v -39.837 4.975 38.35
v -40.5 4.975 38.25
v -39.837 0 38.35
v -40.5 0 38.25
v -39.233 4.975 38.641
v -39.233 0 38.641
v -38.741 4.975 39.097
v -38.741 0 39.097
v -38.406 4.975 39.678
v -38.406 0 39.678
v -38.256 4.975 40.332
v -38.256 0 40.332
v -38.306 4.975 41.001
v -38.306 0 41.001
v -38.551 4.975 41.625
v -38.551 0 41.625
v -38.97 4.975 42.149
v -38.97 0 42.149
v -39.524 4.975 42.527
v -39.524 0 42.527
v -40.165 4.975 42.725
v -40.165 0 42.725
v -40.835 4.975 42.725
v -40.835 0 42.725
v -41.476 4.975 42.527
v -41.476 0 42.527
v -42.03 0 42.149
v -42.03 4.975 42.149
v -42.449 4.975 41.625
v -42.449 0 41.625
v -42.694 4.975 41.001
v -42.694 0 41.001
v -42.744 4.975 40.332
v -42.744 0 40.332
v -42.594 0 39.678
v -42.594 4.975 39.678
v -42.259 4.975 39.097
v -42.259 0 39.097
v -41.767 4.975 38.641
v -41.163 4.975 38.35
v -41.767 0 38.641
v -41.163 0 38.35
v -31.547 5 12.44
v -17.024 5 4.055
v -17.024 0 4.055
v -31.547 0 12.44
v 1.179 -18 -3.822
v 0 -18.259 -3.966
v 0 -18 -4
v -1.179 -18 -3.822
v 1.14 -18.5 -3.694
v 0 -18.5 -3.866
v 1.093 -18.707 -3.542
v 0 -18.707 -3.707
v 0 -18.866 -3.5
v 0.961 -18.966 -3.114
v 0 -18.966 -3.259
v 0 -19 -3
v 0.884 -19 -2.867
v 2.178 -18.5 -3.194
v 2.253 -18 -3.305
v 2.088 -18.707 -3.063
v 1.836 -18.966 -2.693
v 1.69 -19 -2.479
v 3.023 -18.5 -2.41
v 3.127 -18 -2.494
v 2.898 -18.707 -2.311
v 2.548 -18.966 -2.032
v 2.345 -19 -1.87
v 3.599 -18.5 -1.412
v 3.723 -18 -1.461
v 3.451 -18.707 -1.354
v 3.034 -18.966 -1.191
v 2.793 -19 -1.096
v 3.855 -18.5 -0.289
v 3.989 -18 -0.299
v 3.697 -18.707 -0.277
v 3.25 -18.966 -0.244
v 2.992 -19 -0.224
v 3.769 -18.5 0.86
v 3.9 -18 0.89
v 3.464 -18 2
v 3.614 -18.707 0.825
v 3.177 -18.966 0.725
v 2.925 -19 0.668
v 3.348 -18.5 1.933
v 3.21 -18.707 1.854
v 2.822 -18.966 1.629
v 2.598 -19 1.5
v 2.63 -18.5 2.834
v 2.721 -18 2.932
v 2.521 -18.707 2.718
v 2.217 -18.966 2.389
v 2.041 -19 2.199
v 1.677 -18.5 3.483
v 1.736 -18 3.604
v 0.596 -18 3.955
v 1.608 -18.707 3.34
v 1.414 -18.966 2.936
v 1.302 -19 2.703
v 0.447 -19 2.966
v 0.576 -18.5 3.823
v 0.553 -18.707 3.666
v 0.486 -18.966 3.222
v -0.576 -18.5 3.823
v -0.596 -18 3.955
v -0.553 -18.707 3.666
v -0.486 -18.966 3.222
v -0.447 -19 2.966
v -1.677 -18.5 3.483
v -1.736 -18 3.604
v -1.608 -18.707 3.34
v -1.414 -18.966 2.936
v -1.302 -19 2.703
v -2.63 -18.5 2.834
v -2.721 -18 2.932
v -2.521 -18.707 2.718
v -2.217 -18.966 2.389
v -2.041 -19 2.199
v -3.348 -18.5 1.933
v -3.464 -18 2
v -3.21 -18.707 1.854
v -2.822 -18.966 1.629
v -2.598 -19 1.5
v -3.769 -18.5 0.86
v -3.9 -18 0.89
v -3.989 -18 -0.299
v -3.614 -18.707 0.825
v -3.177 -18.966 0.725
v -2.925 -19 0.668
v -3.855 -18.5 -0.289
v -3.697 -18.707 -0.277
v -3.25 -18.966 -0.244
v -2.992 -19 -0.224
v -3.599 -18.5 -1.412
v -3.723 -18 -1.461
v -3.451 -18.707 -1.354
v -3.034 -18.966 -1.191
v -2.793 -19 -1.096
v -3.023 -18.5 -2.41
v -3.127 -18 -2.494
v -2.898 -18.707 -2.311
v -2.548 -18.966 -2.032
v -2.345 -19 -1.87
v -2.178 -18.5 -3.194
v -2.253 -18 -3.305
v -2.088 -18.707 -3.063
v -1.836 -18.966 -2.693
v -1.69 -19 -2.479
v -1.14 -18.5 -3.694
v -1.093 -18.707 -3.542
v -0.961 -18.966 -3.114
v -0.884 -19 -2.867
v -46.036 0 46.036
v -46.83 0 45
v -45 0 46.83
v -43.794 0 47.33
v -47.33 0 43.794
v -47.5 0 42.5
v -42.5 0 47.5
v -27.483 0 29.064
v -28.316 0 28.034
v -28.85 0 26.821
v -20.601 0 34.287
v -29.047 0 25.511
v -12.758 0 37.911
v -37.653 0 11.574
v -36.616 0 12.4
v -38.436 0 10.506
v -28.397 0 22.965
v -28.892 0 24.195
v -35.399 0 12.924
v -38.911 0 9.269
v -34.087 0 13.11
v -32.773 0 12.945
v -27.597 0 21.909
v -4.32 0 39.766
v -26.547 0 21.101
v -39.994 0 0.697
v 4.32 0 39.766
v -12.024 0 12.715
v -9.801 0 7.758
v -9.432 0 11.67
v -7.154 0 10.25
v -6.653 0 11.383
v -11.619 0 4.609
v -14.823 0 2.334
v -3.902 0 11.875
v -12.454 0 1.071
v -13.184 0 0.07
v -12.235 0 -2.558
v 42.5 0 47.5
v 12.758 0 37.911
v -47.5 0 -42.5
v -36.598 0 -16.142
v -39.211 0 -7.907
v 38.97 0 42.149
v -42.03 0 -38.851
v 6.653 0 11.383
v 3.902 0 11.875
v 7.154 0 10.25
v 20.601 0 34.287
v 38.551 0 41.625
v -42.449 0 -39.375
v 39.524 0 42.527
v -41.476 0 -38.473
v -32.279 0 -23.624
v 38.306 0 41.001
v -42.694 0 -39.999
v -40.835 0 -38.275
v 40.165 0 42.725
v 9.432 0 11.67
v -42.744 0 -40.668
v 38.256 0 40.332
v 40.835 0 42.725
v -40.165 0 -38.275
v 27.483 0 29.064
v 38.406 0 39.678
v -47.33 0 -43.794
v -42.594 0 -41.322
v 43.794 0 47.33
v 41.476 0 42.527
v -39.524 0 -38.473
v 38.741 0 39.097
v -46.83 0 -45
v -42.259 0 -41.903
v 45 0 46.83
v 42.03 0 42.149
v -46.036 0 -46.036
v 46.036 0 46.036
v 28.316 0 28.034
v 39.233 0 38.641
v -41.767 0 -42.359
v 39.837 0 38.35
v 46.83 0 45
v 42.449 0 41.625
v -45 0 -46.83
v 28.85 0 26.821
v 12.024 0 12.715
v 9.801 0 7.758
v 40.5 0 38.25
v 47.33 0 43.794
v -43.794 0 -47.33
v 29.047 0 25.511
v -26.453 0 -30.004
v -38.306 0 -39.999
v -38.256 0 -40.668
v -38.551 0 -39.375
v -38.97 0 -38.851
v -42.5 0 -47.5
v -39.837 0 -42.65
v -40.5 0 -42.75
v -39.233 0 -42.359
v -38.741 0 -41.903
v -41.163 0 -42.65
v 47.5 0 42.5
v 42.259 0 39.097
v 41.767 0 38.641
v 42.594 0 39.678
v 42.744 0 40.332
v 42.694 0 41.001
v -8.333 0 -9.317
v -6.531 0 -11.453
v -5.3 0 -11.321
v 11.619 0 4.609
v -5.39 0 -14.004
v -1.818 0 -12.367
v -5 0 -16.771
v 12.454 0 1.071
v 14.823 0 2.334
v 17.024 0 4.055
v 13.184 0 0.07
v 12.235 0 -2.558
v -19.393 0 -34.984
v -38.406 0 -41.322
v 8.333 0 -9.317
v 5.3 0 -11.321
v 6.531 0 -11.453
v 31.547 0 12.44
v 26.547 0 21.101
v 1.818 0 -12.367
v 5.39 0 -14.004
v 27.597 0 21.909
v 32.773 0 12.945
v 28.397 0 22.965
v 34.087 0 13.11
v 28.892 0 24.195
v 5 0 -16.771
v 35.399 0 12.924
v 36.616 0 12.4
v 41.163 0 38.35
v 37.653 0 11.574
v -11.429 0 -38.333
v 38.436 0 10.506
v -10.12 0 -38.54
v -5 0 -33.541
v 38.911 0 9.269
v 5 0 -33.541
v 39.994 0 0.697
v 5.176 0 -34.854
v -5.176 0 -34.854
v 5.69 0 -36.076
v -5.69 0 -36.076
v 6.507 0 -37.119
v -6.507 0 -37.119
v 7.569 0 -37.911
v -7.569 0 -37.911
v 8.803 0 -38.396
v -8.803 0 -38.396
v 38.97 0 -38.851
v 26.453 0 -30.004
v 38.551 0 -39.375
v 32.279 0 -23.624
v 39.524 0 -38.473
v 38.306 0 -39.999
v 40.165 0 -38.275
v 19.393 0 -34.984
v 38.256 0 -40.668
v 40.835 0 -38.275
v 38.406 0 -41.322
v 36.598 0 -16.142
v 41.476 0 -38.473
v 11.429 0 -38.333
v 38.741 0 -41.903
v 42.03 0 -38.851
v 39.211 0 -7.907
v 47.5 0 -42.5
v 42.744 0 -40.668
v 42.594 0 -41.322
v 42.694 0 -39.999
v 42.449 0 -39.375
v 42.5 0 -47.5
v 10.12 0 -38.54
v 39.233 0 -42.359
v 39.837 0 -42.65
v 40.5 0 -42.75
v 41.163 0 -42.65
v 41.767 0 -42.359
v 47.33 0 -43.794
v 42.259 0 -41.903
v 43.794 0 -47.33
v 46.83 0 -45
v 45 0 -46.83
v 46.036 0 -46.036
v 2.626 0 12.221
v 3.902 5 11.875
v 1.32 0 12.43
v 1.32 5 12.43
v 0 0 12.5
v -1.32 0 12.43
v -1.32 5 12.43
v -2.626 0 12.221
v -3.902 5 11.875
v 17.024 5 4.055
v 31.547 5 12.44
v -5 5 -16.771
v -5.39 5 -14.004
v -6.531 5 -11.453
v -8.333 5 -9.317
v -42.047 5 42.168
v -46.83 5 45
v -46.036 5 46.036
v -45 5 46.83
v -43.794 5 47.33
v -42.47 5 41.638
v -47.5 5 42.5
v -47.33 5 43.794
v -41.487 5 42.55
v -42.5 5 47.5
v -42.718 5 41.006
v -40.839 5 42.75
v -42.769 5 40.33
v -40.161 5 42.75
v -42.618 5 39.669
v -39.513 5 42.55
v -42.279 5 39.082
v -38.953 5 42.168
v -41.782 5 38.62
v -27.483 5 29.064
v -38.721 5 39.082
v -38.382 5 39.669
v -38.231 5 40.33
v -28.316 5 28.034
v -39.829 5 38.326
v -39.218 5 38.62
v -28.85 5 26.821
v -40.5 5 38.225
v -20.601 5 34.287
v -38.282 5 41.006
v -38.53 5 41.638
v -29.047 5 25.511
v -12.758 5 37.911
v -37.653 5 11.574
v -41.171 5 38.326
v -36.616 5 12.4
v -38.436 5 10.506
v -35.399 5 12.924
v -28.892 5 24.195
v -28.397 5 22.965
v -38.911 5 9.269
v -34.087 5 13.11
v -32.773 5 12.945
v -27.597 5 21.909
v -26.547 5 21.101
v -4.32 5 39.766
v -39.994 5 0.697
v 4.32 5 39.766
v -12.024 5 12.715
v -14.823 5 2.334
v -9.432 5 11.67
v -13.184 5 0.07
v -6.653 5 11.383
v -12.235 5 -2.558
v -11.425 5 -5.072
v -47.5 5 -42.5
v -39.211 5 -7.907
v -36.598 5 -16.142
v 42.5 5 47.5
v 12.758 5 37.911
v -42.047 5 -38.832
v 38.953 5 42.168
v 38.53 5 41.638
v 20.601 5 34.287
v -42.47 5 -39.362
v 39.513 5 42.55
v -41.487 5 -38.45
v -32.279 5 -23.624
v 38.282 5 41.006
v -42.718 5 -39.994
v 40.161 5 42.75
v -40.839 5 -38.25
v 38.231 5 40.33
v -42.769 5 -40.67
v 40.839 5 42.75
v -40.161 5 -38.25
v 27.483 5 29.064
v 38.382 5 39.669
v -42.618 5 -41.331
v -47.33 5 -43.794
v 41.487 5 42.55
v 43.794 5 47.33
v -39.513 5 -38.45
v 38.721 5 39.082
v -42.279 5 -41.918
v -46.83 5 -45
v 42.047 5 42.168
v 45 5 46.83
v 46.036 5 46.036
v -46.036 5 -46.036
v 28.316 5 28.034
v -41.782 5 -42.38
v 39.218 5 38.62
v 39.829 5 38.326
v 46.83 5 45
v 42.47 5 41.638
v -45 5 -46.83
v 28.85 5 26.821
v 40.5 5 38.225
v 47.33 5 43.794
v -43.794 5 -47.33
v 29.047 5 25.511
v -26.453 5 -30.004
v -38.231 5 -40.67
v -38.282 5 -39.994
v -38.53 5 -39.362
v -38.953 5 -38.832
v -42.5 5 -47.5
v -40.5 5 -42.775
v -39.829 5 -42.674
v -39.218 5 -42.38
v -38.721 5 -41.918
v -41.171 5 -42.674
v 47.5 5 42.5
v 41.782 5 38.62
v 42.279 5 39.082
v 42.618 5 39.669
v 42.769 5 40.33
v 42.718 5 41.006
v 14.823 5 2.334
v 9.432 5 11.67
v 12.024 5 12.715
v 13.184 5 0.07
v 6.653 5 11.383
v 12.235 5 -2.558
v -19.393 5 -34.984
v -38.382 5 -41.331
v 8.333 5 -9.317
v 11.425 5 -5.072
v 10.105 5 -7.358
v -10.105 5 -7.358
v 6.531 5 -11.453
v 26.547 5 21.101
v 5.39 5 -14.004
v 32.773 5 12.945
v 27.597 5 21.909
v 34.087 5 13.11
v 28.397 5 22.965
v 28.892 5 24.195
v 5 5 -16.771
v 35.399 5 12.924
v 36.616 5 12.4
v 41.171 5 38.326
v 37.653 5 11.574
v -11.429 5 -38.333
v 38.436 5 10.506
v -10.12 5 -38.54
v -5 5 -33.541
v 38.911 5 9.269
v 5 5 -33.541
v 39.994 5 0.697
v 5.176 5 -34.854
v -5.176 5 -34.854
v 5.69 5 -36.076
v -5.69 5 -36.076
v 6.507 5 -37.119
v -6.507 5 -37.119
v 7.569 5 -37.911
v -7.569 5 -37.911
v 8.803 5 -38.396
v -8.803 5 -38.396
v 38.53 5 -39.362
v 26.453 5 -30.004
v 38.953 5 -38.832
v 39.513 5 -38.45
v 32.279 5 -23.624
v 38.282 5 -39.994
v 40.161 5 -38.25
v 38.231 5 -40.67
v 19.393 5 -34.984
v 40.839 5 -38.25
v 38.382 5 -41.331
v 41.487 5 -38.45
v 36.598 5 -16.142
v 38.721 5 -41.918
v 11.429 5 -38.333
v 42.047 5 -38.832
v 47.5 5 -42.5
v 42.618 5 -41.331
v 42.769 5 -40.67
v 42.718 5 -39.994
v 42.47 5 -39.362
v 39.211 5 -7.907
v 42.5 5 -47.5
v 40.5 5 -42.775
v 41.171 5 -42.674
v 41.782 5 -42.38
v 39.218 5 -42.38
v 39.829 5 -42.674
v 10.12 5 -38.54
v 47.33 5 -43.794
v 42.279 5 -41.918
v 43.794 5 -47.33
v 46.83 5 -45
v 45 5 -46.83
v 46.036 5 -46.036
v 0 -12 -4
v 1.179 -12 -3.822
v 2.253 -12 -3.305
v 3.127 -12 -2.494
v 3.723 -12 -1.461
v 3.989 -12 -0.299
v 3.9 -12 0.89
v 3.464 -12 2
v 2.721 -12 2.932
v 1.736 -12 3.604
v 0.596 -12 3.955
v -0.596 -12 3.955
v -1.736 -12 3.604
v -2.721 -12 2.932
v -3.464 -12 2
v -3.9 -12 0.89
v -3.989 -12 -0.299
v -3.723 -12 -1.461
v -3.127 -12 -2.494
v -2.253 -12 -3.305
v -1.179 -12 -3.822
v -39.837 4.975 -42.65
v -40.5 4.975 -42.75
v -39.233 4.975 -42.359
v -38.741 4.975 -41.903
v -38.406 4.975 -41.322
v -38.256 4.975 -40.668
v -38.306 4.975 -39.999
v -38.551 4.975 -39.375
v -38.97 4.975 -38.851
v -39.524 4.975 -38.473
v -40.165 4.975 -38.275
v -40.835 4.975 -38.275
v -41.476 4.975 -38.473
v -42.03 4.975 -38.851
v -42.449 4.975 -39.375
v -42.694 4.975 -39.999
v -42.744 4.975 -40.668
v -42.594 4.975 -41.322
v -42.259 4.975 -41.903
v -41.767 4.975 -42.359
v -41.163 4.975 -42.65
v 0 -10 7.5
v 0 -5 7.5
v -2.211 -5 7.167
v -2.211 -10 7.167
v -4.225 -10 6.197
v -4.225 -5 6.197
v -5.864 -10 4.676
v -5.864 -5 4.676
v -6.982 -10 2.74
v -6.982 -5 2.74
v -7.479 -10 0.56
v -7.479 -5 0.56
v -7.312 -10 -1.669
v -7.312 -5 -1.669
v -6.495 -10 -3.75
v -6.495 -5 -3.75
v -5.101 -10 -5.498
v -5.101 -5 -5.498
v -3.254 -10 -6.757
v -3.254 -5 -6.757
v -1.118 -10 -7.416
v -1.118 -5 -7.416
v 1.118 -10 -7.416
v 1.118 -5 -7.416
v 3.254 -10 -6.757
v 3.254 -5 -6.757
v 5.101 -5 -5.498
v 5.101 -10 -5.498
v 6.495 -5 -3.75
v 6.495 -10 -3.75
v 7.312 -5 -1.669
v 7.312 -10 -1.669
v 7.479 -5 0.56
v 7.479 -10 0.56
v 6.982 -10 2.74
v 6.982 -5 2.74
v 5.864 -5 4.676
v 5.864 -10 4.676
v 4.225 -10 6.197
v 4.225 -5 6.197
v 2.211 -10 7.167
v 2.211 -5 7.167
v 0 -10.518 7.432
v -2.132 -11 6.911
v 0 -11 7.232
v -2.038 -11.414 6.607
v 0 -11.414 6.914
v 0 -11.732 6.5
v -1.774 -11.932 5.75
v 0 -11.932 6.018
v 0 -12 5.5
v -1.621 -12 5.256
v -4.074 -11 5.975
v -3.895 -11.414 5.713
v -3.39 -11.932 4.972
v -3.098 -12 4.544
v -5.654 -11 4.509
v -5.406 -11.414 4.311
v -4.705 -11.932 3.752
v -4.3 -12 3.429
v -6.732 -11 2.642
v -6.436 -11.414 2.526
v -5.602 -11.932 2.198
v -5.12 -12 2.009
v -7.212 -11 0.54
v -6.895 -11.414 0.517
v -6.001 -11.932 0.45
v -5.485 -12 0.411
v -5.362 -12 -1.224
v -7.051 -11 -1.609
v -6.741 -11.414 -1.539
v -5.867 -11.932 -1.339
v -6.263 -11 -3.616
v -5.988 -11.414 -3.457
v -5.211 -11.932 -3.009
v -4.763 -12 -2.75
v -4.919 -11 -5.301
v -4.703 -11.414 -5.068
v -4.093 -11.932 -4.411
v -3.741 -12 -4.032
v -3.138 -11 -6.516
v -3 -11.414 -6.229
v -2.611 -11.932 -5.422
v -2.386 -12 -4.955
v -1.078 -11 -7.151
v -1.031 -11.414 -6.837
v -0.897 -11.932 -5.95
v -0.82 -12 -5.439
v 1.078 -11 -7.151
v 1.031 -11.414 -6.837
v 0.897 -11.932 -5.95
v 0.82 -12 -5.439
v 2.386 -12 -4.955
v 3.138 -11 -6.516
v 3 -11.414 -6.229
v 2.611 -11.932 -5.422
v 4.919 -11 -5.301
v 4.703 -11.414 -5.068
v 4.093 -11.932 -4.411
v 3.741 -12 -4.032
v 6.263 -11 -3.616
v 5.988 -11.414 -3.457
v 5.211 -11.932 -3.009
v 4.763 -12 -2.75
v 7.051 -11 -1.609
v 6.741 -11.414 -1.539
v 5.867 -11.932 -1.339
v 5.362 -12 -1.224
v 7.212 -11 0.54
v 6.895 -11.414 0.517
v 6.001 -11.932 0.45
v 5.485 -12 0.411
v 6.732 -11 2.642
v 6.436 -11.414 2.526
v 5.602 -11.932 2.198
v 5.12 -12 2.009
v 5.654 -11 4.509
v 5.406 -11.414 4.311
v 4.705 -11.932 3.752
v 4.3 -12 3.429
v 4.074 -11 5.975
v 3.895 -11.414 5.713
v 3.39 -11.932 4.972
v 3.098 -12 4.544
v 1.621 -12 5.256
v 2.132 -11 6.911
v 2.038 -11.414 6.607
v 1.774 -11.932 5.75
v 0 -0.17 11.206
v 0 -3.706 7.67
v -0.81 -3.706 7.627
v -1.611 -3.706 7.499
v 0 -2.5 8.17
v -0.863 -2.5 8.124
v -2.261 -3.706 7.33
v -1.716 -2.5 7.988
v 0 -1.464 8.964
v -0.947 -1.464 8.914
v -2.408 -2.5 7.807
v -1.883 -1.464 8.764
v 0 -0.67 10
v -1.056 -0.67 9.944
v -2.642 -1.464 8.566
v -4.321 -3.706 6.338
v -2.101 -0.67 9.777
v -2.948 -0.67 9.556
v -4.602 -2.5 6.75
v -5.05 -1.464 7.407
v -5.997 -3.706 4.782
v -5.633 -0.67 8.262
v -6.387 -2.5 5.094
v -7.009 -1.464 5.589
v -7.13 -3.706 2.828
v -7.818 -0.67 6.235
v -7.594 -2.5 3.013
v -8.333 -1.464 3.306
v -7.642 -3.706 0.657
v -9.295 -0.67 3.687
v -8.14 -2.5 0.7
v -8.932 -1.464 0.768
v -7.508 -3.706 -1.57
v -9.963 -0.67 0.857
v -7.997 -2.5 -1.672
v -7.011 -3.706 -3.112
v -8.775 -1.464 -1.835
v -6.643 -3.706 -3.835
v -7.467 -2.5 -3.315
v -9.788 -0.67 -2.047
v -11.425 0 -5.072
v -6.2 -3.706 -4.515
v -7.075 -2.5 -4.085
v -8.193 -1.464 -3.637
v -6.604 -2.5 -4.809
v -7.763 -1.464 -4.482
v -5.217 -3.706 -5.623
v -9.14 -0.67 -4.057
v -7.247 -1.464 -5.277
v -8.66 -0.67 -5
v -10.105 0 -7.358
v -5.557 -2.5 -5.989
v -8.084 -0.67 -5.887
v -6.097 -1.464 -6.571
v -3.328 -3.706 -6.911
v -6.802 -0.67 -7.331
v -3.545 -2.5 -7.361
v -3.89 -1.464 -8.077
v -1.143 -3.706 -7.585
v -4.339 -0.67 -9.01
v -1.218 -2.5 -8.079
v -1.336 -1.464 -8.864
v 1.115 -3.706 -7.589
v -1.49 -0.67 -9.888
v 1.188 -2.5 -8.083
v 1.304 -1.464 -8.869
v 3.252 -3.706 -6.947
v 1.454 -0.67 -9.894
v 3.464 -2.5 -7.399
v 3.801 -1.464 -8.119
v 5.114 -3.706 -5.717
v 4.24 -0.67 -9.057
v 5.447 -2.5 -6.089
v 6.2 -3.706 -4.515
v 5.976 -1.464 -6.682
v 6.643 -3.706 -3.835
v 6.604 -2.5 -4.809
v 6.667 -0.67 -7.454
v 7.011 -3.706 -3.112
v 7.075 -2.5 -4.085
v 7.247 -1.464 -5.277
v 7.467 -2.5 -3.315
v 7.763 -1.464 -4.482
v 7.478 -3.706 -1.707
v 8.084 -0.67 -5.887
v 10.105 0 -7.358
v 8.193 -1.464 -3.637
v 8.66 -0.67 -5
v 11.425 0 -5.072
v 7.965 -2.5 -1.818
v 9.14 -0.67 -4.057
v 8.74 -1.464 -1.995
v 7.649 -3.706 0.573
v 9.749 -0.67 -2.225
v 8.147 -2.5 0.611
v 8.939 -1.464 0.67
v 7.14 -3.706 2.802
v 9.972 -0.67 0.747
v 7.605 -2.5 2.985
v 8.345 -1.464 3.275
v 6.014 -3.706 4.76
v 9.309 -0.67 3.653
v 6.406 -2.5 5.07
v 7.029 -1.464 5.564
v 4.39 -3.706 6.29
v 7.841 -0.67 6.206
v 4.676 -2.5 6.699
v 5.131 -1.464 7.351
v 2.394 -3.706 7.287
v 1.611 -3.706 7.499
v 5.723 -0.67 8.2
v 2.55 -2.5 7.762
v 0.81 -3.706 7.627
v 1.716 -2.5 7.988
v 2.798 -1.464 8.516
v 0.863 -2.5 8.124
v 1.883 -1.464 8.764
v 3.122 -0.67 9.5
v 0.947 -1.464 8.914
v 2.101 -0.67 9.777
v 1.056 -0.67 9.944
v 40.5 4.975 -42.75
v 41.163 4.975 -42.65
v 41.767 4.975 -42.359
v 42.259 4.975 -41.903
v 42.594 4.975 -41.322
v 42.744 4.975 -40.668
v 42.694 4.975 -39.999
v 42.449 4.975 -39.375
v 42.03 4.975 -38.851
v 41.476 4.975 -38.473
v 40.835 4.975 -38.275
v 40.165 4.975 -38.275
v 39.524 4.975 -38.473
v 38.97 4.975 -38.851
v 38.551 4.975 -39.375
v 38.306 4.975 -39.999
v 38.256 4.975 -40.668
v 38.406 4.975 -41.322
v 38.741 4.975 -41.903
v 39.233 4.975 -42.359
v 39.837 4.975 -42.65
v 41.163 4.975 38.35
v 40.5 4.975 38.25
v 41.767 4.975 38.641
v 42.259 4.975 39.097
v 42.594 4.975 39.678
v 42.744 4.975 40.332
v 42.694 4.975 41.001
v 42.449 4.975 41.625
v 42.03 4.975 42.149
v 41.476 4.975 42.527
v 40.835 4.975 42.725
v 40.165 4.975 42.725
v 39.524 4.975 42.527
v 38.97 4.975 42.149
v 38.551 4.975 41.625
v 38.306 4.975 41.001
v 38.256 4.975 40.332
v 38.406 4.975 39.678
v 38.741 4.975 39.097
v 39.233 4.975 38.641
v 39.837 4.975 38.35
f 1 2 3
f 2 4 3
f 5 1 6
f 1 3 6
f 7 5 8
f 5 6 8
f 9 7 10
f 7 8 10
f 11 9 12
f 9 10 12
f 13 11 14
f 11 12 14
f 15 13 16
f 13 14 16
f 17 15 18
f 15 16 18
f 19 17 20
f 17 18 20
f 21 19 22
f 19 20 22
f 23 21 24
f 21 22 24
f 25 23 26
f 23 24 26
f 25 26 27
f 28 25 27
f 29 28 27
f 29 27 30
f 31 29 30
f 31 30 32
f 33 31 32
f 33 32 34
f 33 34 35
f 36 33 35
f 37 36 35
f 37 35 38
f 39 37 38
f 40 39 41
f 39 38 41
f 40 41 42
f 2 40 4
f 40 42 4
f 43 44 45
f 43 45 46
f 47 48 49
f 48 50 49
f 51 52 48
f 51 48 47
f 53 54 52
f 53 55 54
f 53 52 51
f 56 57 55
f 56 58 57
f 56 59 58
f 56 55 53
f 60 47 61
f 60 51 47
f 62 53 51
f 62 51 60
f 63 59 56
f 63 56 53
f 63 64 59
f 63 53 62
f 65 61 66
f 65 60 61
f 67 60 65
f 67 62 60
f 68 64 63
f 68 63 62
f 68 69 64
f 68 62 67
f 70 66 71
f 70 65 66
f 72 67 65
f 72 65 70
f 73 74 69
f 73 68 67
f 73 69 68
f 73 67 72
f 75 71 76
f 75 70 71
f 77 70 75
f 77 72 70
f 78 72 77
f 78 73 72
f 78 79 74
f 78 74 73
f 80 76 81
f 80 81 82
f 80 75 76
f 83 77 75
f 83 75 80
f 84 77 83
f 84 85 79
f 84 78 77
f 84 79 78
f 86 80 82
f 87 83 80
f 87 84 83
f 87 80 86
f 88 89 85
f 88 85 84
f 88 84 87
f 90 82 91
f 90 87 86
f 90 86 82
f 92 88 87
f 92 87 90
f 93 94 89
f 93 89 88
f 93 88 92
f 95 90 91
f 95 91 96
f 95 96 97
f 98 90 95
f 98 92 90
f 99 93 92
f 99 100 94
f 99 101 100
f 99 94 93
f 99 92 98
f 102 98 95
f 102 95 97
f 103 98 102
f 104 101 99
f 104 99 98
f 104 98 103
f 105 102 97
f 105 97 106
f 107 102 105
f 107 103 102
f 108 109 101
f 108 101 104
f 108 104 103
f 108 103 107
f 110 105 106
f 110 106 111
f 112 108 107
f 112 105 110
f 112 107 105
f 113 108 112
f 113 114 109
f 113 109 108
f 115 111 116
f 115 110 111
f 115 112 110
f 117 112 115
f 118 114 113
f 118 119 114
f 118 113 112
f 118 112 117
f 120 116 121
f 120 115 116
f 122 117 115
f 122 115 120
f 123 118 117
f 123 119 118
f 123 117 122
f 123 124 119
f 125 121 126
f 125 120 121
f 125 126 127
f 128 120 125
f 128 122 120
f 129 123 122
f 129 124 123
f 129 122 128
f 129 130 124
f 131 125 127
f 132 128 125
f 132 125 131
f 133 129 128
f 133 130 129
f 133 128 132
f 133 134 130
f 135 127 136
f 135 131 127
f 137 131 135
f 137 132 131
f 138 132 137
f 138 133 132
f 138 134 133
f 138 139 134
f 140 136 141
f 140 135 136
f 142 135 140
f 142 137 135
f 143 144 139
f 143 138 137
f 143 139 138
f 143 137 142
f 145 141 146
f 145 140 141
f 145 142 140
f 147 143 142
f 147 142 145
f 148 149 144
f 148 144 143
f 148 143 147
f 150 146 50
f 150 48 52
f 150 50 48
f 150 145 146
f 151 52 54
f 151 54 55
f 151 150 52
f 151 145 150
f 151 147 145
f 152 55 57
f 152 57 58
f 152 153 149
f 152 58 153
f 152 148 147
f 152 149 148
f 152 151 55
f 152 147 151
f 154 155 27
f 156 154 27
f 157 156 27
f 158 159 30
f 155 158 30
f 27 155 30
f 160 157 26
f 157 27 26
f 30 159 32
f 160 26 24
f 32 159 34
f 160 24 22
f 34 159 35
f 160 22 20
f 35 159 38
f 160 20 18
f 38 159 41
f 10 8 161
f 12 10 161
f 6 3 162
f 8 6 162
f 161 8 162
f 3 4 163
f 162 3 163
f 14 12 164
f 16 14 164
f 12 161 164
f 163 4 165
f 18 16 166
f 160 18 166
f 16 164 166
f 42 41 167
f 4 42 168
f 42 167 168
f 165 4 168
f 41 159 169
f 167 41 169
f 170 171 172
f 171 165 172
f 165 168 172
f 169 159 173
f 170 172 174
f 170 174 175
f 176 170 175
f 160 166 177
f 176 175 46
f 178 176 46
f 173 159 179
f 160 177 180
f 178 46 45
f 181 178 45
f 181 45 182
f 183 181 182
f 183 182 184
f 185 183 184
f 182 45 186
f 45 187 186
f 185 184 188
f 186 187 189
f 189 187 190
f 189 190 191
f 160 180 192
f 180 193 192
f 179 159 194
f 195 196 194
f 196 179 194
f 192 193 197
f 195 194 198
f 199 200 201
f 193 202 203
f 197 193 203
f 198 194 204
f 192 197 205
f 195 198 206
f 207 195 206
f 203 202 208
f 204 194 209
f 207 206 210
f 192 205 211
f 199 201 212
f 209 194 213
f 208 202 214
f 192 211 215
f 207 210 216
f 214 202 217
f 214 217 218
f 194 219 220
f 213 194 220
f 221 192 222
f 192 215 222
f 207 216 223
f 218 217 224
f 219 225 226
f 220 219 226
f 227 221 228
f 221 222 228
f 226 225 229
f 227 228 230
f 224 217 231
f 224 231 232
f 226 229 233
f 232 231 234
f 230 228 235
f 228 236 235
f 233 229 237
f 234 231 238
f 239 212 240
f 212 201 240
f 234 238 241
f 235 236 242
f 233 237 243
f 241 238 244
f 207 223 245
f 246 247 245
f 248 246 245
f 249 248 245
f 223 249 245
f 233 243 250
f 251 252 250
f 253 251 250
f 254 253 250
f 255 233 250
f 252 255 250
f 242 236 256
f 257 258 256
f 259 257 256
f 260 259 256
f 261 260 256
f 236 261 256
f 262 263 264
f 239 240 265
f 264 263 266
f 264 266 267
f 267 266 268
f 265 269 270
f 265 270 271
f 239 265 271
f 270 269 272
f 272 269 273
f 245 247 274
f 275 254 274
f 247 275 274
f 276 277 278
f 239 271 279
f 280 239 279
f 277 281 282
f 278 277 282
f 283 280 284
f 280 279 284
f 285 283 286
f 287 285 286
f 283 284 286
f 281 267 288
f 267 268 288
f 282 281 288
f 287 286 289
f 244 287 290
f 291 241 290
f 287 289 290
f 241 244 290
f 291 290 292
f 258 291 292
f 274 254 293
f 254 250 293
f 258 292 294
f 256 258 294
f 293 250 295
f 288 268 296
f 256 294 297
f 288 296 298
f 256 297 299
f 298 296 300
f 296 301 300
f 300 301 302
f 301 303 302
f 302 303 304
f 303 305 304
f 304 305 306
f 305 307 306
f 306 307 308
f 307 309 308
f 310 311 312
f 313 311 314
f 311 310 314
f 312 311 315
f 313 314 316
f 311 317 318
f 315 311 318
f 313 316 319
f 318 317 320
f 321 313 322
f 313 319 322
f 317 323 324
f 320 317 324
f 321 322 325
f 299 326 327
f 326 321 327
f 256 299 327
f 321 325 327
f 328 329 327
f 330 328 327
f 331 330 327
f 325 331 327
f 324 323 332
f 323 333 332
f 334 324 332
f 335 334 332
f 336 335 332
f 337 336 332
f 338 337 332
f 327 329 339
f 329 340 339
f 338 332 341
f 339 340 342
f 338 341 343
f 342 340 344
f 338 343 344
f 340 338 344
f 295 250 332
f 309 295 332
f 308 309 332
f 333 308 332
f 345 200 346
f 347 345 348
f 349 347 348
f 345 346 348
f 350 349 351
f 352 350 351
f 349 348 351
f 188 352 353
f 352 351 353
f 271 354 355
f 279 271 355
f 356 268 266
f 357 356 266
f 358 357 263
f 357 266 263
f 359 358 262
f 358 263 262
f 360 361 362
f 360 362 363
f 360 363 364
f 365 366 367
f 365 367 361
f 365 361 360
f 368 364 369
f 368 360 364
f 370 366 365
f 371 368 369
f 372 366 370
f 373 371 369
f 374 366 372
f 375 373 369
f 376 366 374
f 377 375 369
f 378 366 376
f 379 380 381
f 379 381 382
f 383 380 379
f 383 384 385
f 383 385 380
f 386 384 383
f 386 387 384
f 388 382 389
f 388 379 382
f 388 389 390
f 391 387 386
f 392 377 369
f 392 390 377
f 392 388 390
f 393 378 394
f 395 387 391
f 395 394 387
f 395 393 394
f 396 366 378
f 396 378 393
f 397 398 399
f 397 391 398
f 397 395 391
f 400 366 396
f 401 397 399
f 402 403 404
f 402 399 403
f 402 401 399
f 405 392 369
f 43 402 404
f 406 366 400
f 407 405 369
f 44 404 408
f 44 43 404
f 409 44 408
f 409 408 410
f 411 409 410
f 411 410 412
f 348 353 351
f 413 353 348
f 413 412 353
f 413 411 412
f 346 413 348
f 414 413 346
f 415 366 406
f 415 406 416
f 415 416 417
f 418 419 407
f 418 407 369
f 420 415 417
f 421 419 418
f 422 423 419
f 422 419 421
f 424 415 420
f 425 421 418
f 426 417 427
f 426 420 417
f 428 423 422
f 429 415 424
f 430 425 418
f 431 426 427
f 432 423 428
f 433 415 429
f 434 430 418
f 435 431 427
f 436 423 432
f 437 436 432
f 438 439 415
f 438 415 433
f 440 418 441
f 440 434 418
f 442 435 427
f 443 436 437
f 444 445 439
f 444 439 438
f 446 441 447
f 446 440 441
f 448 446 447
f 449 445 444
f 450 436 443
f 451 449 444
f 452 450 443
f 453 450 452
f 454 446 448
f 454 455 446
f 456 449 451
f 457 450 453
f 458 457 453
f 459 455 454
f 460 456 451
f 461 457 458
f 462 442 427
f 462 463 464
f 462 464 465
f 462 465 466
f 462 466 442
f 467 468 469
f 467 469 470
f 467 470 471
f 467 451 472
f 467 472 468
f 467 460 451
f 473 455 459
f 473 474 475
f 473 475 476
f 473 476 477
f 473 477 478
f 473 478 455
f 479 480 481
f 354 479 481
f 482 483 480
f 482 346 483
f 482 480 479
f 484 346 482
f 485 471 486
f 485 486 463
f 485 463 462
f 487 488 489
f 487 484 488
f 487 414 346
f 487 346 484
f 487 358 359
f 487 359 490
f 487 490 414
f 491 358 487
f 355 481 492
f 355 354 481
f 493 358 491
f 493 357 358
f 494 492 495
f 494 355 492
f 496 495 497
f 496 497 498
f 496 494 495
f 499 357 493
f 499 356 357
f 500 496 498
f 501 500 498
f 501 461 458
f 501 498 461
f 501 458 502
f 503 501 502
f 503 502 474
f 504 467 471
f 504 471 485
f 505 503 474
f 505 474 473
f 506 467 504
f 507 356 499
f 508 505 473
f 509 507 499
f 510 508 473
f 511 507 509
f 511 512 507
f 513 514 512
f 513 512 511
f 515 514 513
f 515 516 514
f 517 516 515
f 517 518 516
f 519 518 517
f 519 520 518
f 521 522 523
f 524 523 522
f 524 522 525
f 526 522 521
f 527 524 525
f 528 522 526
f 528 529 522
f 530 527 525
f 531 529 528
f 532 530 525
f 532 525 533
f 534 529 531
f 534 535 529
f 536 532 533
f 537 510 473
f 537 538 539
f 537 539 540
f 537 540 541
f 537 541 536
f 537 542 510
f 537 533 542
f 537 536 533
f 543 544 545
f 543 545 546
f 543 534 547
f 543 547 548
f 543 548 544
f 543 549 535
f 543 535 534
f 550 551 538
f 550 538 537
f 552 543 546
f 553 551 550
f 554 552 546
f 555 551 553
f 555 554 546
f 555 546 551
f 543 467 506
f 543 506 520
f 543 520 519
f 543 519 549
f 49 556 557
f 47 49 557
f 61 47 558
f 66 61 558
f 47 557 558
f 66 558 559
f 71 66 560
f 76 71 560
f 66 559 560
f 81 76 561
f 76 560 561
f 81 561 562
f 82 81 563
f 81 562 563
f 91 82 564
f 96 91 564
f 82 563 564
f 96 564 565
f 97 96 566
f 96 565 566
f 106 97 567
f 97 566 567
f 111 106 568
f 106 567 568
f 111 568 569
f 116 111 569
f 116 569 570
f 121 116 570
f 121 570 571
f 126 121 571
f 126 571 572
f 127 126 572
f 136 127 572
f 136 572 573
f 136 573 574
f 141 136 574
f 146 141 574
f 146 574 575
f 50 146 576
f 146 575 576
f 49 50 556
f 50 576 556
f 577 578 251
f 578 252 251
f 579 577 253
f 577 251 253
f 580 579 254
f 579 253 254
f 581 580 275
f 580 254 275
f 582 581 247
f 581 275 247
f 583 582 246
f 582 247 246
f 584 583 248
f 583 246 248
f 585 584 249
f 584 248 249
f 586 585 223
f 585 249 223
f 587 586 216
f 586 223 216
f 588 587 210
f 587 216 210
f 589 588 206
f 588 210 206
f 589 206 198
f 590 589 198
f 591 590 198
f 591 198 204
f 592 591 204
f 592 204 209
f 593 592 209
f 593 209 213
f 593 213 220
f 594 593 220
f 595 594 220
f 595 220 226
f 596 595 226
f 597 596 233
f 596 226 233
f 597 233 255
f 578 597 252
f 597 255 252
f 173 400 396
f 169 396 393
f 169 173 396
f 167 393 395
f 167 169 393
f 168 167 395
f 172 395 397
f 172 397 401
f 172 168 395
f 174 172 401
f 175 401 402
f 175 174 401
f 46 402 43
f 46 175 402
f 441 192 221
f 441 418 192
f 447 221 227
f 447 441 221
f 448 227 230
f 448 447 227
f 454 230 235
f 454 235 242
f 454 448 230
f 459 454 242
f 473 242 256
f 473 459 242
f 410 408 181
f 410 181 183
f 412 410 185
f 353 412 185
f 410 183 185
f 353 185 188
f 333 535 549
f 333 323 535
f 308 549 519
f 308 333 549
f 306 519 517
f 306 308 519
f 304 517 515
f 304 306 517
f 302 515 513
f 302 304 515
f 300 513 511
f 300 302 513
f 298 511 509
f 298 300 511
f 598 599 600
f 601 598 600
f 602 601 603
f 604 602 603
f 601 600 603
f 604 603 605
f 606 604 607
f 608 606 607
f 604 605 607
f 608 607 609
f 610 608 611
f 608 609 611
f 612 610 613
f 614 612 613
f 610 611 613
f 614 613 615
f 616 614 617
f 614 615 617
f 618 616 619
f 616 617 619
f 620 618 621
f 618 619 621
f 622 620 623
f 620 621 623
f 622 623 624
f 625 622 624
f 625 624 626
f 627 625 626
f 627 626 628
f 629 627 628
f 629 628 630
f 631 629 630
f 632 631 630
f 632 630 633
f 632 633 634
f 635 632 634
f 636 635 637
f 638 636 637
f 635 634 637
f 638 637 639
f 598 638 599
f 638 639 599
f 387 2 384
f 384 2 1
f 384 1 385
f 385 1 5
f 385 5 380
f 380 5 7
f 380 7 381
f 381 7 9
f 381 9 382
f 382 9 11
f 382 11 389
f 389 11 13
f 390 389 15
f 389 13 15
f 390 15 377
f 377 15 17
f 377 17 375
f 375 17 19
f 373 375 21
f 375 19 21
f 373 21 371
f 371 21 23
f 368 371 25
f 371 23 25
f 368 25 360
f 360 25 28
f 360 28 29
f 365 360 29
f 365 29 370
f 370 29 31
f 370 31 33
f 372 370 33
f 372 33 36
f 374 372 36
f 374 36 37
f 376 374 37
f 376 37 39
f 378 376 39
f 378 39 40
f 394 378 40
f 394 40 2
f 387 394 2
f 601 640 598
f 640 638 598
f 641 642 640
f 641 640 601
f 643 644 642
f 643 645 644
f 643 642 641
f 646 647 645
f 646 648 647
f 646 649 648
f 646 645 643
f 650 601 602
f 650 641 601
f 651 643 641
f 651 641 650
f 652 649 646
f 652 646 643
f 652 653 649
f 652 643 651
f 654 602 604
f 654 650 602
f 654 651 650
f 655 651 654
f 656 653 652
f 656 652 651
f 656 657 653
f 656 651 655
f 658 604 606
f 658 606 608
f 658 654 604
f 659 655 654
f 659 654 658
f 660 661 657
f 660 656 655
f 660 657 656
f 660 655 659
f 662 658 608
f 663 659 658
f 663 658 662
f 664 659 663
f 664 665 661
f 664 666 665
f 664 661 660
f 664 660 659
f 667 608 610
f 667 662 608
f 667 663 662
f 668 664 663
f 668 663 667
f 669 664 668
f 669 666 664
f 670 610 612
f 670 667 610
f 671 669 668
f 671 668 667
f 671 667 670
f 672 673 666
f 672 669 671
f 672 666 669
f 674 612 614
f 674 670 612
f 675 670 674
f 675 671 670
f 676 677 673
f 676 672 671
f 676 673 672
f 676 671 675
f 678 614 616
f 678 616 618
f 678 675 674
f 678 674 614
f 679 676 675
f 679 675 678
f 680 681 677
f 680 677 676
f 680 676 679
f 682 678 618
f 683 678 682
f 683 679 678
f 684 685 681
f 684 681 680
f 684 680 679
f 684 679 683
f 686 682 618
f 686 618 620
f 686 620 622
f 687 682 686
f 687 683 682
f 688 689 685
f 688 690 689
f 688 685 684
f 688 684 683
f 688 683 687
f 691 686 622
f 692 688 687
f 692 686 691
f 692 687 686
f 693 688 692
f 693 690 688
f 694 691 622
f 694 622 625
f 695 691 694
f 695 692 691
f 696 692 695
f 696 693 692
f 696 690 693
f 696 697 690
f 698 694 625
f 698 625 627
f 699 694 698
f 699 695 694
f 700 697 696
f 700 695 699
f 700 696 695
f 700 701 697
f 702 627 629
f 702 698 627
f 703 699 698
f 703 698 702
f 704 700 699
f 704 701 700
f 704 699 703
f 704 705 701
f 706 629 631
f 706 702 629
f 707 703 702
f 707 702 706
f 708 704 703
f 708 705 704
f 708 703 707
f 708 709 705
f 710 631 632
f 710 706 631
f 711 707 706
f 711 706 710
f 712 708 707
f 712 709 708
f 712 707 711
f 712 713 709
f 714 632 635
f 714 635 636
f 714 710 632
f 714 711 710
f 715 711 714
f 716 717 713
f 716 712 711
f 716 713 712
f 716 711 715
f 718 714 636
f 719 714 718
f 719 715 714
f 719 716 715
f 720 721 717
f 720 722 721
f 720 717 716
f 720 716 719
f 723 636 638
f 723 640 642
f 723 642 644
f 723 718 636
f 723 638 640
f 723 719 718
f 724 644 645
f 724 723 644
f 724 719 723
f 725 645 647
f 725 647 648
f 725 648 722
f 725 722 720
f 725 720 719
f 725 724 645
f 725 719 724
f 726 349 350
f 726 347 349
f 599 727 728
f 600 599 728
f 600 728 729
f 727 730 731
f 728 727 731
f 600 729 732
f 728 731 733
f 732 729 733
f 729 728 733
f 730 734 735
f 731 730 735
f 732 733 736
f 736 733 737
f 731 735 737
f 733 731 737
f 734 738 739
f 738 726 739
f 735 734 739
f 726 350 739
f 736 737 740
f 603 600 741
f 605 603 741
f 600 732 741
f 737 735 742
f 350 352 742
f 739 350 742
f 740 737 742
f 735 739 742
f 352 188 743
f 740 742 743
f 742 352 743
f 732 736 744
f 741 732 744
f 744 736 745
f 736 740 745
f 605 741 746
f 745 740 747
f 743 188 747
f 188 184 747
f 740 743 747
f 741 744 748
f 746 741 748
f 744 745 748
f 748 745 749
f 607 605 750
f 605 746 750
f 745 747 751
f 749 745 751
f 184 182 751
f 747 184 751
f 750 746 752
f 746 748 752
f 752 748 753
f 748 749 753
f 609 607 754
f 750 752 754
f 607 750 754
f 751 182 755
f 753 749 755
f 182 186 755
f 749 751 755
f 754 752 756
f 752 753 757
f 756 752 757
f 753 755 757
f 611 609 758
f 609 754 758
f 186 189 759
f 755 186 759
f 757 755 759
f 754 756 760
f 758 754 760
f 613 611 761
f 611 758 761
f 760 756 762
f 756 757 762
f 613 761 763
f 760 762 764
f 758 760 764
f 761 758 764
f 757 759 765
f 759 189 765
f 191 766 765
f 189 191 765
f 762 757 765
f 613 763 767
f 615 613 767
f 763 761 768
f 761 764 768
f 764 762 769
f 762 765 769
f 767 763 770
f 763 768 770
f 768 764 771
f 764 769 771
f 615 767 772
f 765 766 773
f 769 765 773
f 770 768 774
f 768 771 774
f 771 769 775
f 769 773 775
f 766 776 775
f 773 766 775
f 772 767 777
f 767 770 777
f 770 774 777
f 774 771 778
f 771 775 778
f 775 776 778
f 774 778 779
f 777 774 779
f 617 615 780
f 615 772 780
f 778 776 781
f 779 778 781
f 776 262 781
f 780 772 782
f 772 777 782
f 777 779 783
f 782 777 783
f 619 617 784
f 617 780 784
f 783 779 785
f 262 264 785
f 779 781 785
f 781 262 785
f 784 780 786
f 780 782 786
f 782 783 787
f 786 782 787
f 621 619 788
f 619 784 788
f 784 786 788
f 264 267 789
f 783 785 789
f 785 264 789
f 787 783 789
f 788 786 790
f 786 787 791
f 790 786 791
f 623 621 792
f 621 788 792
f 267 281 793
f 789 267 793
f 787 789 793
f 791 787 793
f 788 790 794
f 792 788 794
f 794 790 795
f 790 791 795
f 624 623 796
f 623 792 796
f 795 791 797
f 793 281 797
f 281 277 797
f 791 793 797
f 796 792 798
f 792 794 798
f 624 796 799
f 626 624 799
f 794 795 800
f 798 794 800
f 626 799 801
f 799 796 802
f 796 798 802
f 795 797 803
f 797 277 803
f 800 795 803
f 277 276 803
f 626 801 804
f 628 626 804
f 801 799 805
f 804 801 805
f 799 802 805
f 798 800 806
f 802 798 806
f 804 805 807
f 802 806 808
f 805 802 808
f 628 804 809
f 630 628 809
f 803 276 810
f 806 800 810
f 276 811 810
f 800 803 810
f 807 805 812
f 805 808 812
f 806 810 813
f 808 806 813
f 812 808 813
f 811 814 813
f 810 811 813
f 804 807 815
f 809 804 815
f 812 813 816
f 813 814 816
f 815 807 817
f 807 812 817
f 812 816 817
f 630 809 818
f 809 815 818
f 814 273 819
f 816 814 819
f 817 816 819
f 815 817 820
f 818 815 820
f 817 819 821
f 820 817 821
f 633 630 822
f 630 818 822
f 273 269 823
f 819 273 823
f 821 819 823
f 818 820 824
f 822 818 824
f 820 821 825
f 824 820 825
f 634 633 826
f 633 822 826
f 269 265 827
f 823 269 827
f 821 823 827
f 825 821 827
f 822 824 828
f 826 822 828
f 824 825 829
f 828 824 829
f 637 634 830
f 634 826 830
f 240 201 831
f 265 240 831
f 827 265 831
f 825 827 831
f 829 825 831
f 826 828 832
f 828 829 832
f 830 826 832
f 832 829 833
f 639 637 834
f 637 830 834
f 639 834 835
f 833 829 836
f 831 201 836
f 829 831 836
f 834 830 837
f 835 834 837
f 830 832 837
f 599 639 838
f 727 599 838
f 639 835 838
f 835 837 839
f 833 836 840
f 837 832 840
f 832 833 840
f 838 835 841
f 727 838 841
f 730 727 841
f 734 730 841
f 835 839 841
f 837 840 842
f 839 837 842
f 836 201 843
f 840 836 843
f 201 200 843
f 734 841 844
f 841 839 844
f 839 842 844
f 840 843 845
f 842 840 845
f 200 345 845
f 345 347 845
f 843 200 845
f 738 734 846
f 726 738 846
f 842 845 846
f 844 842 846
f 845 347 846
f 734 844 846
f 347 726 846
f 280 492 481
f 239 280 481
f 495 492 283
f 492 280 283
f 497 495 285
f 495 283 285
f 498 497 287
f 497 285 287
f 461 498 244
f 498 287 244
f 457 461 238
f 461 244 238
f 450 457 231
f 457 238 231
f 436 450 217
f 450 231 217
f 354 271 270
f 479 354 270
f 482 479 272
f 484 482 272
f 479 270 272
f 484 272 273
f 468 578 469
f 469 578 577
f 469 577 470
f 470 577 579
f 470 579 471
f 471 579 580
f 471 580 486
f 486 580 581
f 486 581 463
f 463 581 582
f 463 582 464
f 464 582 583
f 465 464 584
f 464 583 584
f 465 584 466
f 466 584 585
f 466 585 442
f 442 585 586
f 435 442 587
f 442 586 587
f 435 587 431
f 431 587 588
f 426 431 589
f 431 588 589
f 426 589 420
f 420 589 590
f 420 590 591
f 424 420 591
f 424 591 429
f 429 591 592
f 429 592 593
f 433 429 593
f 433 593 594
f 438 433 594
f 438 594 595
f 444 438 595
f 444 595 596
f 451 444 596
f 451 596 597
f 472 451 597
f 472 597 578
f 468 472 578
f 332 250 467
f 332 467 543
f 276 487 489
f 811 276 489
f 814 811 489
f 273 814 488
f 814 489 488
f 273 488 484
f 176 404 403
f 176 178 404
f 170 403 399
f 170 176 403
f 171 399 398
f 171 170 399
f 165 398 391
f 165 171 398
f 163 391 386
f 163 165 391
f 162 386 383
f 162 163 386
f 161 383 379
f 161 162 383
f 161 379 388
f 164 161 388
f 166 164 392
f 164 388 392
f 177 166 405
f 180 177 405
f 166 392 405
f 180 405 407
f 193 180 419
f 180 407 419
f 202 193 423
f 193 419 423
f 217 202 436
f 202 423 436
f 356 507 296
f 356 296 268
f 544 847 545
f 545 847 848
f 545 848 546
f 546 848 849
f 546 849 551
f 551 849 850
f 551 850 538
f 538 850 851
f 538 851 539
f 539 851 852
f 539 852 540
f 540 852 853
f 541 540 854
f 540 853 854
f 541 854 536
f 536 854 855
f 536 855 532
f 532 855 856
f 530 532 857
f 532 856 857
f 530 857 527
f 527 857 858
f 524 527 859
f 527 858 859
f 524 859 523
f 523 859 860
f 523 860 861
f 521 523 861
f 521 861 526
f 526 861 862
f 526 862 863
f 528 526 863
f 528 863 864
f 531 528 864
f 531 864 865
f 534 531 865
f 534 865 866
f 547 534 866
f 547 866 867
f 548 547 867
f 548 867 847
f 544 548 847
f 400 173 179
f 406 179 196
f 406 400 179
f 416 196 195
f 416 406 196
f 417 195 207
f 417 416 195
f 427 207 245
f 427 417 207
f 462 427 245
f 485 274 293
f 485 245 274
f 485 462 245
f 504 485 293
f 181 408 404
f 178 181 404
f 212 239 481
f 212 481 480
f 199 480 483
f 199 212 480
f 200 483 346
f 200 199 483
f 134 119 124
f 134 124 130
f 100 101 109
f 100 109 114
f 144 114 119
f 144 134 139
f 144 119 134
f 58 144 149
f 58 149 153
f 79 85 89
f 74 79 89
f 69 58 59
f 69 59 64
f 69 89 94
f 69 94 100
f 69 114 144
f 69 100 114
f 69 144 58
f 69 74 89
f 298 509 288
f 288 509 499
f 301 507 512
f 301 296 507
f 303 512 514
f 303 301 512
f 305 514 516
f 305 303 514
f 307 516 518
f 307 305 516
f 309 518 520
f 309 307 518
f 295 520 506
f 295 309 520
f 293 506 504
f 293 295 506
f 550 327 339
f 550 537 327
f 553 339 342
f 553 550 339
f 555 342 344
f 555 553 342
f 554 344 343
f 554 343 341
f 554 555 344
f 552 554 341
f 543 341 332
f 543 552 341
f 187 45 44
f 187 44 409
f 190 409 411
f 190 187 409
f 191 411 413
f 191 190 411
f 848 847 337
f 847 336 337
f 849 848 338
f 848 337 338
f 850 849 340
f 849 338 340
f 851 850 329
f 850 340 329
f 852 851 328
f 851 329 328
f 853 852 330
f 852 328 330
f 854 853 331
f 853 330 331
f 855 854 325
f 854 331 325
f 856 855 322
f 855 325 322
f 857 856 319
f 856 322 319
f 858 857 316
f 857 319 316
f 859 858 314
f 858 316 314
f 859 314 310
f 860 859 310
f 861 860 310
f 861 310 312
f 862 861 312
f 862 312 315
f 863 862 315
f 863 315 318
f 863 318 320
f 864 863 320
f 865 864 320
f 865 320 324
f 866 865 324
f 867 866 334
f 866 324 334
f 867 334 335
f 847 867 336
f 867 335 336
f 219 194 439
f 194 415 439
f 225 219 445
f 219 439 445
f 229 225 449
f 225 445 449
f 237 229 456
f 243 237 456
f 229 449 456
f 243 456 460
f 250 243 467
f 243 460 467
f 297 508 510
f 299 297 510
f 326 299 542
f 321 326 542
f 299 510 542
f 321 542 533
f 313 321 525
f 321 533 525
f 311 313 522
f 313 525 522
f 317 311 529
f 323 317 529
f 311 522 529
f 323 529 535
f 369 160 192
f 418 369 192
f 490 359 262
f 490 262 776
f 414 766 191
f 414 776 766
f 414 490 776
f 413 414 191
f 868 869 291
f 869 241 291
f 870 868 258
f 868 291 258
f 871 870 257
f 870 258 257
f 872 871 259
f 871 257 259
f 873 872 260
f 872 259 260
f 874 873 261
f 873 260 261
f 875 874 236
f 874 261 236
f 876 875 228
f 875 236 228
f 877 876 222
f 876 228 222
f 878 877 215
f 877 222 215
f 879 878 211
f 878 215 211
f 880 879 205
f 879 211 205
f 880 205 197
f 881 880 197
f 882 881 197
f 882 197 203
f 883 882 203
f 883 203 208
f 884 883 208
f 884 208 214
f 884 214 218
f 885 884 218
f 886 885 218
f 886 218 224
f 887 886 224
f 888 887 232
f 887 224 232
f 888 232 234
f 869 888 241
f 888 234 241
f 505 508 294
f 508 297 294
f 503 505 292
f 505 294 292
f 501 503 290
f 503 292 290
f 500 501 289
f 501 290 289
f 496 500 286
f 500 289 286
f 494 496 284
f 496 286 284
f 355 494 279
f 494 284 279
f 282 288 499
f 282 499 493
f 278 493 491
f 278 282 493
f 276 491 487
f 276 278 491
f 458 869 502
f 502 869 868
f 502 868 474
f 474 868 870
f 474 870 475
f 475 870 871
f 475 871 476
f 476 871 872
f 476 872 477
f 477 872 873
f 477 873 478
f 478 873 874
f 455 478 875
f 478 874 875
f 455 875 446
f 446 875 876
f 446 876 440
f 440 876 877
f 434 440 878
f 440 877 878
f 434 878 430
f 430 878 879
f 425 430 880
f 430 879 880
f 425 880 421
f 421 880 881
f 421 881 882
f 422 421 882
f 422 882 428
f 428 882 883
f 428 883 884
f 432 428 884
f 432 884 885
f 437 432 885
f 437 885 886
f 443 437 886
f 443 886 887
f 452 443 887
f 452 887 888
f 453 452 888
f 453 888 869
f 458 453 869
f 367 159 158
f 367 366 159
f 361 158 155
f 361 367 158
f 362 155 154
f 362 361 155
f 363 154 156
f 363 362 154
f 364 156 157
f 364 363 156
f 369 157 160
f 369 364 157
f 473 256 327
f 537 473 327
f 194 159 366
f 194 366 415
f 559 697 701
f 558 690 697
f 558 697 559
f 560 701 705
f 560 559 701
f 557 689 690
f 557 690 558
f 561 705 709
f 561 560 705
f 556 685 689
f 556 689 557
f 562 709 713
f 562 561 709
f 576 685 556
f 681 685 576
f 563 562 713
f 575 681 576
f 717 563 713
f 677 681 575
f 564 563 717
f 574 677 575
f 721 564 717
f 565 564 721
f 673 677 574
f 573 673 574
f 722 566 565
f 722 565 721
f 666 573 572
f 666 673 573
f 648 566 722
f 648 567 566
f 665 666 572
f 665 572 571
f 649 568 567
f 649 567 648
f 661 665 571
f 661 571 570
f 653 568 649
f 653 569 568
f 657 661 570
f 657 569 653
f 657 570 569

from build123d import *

# Parameters (mm, degrees)
SKETCH1_W                      = 95
SKETCH1_H                      = 95
BOSS_EXTRUDE1_DEPTH            = 5
FILLET1_R                      = 5
M4_CLEARANCE_HOLE1_D           = 4.5
M4_CLEARANCE_HOLE1_CSINK_D     = 4.55
M4_CLEARANCE_HOLE1_CSINK_ANGLE = 90
SKETCH5_R                      = 7.5
BOSS_EXTRUDE2_DEPTH            = 12
SKETCH6_R                      = 4
BOSS_EXTRUDE3_DEPTH            = 7
FILLET2_R                      = 2
FILLET3_R                      = 5
FILLET4_R                      = 1
CUT_EXTRUDE2_REACH             = 73.334
FILLET5_R                      = 5
FILLET6_R                      = 10


with BuildPart() as part:
    # Sketch1 → Boss-Extrude1 (new body)
    with BuildSketch(Plane(origin=(0, 0, 0), x_dir=(1, 0, 0), z_dir=(0, 1, 0))):
        Rectangle(SKETCH1_W, SKETCH1_H)
    extrude(amount=BOSS_EXTRUDE1_DEPTH)

    # Fillet1
    fillet1_edges = [part.edges().sort_by_distance(p)[0] for p in [
        (-47.50000000000001, 2.5, 47.5),
        (-47.50000000000001, 2.5, -47.5),
        (47.49999999999999, 2.5, -47.5),
        (47.49999999999999, 2.5, 47.5),
    ]]
    fillet(fillet1_edges, radius=FILLET1_R)

    # M4 Clearance Hole1 (through all)
    with Locations(Plane(origin=(-40.5, 5, -40.5), x_dir=(0, 0, 1), z_dir=(0, 1, 0))):
        with Locations((0, 0), (0, 81), (81, 81), (81, 0)):
            CounterSinkHole(M4_CLEARANCE_HOLE1_D / 2, M4_CLEARANCE_HOLE1_CSINK_D / 2, counter_sink_angle=M4_CLEARANCE_HOLE1_CSINK_ANGLE)

    # Sketch5 → Boss-Extrude2 (add)
    with BuildSketch(Plane.XZ):
        with Locations(Location((0, 0, 0), (0, 0, 90))):
            Circle(SKETCH5_R)
    extrude(amount=BOSS_EXTRUDE2_DEPTH)

    # Sketch6 → Boss-Extrude3 (add)
    with BuildSketch(Plane.XZ.offset(12)):
        with Locations(Location((0, 0, 0), (0, 0, 270))):
            Circle(SKETCH6_R)
    extrude(amount=BOSS_EXTRUDE3_DEPTH)

    # Fillet2
    fillet2_edges = [part.edges().sort_by_distance(p)[0] for p in [
        (-4.71e-15, -12, -7.5),
    ]]
    fillet(fillet2_edges, radius=FILLET2_R)

    # Fillet3
    fillet3_edges = [part.edges().sort_by_distance(p)[0] for p in [
        (-4.71e-15, 0, -7.5),
    ]]
    fillet(fillet3_edges, radius=FILLET3_R)

    # Fillet4
    fillet4_edges = [part.edges().sort_by_distance(p)[0] for p in [
        (1.22e-15, -19, 4),
    ]]
    fillet(fillet4_edges, radius=FILLET4_R)

    # Sketch2 → Cut-Extrude2 (cut, up to next)
    with BuildSketch(Plane(origin=(0, 5, 0), x_dir=(1, 0, 0), z_dir=(0, 1, 0)), mode=Mode.PRIVATE) as cut_extrude2_sk1:
        with BuildLine():
            Line((5.000000000000003, 39.68626966596886), (4.999999999999999, 11.456439237389601))
            ThreePointArc((4.999999999999999, 11.456439237389601), (10.8253175473055, 6.249999999999979), (12.421567416492215, -1.398092599772662))
            Line((12.421567416492215, -1.398092599772662), (36.86931771216872, -15.51300781406241))
            ThreePointArc((36.86931771216872, -15.51300781406241), (34.64101615137759, 19.99999999999991), (5.000000000000003, 39.68626966596886))
        make_face()
    cut_extrude2_tool1 = extrude(cut_extrude2_sk1.sketch, amount=-CUT_EXTRUDE2_REACH, mode=Mode.PRIVATE) & part.part
    # Sketch2 → Cut-Extrude2 (cut, up to next)
    with BuildSketch(Plane(origin=(0, 5, 0), x_dir=(1, 0, 0), z_dir=(0, 1, 0)), mode=Mode.PRIVATE) as cut_extrude2_sk2:
        with BuildLine():
            Line((-5.000000000000003, 39.68626966596886), (-4.999999999999999, 11.456439237389601))
            ThreePointArc((-4.999999999999999, 11.456439237389601), (-10.825317547305497, 6.249999999999976), (-12.42156741649221, -1.3980925997726692))
            Line((-12.42156741649221, -1.3980925997726692), (-36.86931771216872, -15.513007814062414))
            ThreePointArc((-36.86931771216872, -15.513007814062414), (-34.64101615137759, 19.999999999999922), (-5.000000000000003, 39.68626966596886))
        make_face()
    cut_extrude2_tool2 = extrude(cut_extrude2_sk2.sketch, amount=-CUT_EXTRUDE2_REACH, mode=Mode.PRIVATE) & part.part
    # Sketch2 → Cut-Extrude2 (cut, up to next)
    with BuildSketch(Plane(origin=(0, 5, 0), x_dir=(1, 0, 0), z_dir=(0, 1, 0)), mode=Mode.PRIVATE) as cut_extrude2_sk3:
        with BuildLine():
            Line((-7.4215674164921674, -10.058346637617028), (-31.86931771216868, -24.173261851906783))
            ThreePointArc((-31.86931771216868, -24.173261851906783), (2.45e-15, -40), (31.869317712168694, -24.173261851906773))
            Line((31.869317712168694, -24.173261851906773), (7.421567416492171, -10.058346637617028))
            ThreePointArc((7.421567416492171, -10.058346637617028), (7.7e-16, -12.5), (-7.4215674164921674, -10.058346637617028))
        make_face()
    cut_extrude2_tool3 = extrude(cut_extrude2_sk3.sketch, amount=-CUT_EXTRUDE2_REACH, mode=Mode.PRIVATE) & part.part
    add(cut_extrude2_tool1.solids().sort_by_distance((22.174901, 5, -12.802685))[0], mode=Mode.SUBTRACT)
    add(cut_extrude2_tool2.solids().sort_by_distance((-22.174901, 5, -12.802685))[0], mode=Mode.SUBTRACT)
    add(cut_extrude2_tool3.solids().sort_by_distance((0, 5, 25.60537))[0], mode=Mode.SUBTRACT)

    # Fillet5
    fillet5_edges = [part.edges().sort_by_distance(p)[0] for p in [
        (-36.86931771216872, 2.5, 15.513007814062414),
        (-4.999999999999998, 2.5, -39.68626966596885),
        (31.869317712168694, 2.5, 24.173261851906776),
        (-31.869317712168684, 2.5, 24.173261851906787),
        (5.000000000000002, 2.5, -39.68626966596885),
        (36.86931771216872, 2.5, 15.51300781406241),
    ]]
    fillet(fillet5_edges, radius=FILLET5_R)

    # Fillet6
    fillet6_edges = [part.edges().sort_by_distance(p)[0] for p in [
        (-4.999999999999998, 2.5, -11.456439237389603),
        (-12.42156741649221, 2.5, 1.398092599772669),
        (-7.421567416492167, 2.5, 10.058346637617028),
        (7.42156741649217, 2.5, 10.058346637617026),
        (12.421567416492213, 2.5, 1.3980925997726628),
        (4.999999999999999, 2.5, -11.4564392373896),
    ]]
    fillet(fillet6_edges, radius=FILLET6_R)


solid = part.part
